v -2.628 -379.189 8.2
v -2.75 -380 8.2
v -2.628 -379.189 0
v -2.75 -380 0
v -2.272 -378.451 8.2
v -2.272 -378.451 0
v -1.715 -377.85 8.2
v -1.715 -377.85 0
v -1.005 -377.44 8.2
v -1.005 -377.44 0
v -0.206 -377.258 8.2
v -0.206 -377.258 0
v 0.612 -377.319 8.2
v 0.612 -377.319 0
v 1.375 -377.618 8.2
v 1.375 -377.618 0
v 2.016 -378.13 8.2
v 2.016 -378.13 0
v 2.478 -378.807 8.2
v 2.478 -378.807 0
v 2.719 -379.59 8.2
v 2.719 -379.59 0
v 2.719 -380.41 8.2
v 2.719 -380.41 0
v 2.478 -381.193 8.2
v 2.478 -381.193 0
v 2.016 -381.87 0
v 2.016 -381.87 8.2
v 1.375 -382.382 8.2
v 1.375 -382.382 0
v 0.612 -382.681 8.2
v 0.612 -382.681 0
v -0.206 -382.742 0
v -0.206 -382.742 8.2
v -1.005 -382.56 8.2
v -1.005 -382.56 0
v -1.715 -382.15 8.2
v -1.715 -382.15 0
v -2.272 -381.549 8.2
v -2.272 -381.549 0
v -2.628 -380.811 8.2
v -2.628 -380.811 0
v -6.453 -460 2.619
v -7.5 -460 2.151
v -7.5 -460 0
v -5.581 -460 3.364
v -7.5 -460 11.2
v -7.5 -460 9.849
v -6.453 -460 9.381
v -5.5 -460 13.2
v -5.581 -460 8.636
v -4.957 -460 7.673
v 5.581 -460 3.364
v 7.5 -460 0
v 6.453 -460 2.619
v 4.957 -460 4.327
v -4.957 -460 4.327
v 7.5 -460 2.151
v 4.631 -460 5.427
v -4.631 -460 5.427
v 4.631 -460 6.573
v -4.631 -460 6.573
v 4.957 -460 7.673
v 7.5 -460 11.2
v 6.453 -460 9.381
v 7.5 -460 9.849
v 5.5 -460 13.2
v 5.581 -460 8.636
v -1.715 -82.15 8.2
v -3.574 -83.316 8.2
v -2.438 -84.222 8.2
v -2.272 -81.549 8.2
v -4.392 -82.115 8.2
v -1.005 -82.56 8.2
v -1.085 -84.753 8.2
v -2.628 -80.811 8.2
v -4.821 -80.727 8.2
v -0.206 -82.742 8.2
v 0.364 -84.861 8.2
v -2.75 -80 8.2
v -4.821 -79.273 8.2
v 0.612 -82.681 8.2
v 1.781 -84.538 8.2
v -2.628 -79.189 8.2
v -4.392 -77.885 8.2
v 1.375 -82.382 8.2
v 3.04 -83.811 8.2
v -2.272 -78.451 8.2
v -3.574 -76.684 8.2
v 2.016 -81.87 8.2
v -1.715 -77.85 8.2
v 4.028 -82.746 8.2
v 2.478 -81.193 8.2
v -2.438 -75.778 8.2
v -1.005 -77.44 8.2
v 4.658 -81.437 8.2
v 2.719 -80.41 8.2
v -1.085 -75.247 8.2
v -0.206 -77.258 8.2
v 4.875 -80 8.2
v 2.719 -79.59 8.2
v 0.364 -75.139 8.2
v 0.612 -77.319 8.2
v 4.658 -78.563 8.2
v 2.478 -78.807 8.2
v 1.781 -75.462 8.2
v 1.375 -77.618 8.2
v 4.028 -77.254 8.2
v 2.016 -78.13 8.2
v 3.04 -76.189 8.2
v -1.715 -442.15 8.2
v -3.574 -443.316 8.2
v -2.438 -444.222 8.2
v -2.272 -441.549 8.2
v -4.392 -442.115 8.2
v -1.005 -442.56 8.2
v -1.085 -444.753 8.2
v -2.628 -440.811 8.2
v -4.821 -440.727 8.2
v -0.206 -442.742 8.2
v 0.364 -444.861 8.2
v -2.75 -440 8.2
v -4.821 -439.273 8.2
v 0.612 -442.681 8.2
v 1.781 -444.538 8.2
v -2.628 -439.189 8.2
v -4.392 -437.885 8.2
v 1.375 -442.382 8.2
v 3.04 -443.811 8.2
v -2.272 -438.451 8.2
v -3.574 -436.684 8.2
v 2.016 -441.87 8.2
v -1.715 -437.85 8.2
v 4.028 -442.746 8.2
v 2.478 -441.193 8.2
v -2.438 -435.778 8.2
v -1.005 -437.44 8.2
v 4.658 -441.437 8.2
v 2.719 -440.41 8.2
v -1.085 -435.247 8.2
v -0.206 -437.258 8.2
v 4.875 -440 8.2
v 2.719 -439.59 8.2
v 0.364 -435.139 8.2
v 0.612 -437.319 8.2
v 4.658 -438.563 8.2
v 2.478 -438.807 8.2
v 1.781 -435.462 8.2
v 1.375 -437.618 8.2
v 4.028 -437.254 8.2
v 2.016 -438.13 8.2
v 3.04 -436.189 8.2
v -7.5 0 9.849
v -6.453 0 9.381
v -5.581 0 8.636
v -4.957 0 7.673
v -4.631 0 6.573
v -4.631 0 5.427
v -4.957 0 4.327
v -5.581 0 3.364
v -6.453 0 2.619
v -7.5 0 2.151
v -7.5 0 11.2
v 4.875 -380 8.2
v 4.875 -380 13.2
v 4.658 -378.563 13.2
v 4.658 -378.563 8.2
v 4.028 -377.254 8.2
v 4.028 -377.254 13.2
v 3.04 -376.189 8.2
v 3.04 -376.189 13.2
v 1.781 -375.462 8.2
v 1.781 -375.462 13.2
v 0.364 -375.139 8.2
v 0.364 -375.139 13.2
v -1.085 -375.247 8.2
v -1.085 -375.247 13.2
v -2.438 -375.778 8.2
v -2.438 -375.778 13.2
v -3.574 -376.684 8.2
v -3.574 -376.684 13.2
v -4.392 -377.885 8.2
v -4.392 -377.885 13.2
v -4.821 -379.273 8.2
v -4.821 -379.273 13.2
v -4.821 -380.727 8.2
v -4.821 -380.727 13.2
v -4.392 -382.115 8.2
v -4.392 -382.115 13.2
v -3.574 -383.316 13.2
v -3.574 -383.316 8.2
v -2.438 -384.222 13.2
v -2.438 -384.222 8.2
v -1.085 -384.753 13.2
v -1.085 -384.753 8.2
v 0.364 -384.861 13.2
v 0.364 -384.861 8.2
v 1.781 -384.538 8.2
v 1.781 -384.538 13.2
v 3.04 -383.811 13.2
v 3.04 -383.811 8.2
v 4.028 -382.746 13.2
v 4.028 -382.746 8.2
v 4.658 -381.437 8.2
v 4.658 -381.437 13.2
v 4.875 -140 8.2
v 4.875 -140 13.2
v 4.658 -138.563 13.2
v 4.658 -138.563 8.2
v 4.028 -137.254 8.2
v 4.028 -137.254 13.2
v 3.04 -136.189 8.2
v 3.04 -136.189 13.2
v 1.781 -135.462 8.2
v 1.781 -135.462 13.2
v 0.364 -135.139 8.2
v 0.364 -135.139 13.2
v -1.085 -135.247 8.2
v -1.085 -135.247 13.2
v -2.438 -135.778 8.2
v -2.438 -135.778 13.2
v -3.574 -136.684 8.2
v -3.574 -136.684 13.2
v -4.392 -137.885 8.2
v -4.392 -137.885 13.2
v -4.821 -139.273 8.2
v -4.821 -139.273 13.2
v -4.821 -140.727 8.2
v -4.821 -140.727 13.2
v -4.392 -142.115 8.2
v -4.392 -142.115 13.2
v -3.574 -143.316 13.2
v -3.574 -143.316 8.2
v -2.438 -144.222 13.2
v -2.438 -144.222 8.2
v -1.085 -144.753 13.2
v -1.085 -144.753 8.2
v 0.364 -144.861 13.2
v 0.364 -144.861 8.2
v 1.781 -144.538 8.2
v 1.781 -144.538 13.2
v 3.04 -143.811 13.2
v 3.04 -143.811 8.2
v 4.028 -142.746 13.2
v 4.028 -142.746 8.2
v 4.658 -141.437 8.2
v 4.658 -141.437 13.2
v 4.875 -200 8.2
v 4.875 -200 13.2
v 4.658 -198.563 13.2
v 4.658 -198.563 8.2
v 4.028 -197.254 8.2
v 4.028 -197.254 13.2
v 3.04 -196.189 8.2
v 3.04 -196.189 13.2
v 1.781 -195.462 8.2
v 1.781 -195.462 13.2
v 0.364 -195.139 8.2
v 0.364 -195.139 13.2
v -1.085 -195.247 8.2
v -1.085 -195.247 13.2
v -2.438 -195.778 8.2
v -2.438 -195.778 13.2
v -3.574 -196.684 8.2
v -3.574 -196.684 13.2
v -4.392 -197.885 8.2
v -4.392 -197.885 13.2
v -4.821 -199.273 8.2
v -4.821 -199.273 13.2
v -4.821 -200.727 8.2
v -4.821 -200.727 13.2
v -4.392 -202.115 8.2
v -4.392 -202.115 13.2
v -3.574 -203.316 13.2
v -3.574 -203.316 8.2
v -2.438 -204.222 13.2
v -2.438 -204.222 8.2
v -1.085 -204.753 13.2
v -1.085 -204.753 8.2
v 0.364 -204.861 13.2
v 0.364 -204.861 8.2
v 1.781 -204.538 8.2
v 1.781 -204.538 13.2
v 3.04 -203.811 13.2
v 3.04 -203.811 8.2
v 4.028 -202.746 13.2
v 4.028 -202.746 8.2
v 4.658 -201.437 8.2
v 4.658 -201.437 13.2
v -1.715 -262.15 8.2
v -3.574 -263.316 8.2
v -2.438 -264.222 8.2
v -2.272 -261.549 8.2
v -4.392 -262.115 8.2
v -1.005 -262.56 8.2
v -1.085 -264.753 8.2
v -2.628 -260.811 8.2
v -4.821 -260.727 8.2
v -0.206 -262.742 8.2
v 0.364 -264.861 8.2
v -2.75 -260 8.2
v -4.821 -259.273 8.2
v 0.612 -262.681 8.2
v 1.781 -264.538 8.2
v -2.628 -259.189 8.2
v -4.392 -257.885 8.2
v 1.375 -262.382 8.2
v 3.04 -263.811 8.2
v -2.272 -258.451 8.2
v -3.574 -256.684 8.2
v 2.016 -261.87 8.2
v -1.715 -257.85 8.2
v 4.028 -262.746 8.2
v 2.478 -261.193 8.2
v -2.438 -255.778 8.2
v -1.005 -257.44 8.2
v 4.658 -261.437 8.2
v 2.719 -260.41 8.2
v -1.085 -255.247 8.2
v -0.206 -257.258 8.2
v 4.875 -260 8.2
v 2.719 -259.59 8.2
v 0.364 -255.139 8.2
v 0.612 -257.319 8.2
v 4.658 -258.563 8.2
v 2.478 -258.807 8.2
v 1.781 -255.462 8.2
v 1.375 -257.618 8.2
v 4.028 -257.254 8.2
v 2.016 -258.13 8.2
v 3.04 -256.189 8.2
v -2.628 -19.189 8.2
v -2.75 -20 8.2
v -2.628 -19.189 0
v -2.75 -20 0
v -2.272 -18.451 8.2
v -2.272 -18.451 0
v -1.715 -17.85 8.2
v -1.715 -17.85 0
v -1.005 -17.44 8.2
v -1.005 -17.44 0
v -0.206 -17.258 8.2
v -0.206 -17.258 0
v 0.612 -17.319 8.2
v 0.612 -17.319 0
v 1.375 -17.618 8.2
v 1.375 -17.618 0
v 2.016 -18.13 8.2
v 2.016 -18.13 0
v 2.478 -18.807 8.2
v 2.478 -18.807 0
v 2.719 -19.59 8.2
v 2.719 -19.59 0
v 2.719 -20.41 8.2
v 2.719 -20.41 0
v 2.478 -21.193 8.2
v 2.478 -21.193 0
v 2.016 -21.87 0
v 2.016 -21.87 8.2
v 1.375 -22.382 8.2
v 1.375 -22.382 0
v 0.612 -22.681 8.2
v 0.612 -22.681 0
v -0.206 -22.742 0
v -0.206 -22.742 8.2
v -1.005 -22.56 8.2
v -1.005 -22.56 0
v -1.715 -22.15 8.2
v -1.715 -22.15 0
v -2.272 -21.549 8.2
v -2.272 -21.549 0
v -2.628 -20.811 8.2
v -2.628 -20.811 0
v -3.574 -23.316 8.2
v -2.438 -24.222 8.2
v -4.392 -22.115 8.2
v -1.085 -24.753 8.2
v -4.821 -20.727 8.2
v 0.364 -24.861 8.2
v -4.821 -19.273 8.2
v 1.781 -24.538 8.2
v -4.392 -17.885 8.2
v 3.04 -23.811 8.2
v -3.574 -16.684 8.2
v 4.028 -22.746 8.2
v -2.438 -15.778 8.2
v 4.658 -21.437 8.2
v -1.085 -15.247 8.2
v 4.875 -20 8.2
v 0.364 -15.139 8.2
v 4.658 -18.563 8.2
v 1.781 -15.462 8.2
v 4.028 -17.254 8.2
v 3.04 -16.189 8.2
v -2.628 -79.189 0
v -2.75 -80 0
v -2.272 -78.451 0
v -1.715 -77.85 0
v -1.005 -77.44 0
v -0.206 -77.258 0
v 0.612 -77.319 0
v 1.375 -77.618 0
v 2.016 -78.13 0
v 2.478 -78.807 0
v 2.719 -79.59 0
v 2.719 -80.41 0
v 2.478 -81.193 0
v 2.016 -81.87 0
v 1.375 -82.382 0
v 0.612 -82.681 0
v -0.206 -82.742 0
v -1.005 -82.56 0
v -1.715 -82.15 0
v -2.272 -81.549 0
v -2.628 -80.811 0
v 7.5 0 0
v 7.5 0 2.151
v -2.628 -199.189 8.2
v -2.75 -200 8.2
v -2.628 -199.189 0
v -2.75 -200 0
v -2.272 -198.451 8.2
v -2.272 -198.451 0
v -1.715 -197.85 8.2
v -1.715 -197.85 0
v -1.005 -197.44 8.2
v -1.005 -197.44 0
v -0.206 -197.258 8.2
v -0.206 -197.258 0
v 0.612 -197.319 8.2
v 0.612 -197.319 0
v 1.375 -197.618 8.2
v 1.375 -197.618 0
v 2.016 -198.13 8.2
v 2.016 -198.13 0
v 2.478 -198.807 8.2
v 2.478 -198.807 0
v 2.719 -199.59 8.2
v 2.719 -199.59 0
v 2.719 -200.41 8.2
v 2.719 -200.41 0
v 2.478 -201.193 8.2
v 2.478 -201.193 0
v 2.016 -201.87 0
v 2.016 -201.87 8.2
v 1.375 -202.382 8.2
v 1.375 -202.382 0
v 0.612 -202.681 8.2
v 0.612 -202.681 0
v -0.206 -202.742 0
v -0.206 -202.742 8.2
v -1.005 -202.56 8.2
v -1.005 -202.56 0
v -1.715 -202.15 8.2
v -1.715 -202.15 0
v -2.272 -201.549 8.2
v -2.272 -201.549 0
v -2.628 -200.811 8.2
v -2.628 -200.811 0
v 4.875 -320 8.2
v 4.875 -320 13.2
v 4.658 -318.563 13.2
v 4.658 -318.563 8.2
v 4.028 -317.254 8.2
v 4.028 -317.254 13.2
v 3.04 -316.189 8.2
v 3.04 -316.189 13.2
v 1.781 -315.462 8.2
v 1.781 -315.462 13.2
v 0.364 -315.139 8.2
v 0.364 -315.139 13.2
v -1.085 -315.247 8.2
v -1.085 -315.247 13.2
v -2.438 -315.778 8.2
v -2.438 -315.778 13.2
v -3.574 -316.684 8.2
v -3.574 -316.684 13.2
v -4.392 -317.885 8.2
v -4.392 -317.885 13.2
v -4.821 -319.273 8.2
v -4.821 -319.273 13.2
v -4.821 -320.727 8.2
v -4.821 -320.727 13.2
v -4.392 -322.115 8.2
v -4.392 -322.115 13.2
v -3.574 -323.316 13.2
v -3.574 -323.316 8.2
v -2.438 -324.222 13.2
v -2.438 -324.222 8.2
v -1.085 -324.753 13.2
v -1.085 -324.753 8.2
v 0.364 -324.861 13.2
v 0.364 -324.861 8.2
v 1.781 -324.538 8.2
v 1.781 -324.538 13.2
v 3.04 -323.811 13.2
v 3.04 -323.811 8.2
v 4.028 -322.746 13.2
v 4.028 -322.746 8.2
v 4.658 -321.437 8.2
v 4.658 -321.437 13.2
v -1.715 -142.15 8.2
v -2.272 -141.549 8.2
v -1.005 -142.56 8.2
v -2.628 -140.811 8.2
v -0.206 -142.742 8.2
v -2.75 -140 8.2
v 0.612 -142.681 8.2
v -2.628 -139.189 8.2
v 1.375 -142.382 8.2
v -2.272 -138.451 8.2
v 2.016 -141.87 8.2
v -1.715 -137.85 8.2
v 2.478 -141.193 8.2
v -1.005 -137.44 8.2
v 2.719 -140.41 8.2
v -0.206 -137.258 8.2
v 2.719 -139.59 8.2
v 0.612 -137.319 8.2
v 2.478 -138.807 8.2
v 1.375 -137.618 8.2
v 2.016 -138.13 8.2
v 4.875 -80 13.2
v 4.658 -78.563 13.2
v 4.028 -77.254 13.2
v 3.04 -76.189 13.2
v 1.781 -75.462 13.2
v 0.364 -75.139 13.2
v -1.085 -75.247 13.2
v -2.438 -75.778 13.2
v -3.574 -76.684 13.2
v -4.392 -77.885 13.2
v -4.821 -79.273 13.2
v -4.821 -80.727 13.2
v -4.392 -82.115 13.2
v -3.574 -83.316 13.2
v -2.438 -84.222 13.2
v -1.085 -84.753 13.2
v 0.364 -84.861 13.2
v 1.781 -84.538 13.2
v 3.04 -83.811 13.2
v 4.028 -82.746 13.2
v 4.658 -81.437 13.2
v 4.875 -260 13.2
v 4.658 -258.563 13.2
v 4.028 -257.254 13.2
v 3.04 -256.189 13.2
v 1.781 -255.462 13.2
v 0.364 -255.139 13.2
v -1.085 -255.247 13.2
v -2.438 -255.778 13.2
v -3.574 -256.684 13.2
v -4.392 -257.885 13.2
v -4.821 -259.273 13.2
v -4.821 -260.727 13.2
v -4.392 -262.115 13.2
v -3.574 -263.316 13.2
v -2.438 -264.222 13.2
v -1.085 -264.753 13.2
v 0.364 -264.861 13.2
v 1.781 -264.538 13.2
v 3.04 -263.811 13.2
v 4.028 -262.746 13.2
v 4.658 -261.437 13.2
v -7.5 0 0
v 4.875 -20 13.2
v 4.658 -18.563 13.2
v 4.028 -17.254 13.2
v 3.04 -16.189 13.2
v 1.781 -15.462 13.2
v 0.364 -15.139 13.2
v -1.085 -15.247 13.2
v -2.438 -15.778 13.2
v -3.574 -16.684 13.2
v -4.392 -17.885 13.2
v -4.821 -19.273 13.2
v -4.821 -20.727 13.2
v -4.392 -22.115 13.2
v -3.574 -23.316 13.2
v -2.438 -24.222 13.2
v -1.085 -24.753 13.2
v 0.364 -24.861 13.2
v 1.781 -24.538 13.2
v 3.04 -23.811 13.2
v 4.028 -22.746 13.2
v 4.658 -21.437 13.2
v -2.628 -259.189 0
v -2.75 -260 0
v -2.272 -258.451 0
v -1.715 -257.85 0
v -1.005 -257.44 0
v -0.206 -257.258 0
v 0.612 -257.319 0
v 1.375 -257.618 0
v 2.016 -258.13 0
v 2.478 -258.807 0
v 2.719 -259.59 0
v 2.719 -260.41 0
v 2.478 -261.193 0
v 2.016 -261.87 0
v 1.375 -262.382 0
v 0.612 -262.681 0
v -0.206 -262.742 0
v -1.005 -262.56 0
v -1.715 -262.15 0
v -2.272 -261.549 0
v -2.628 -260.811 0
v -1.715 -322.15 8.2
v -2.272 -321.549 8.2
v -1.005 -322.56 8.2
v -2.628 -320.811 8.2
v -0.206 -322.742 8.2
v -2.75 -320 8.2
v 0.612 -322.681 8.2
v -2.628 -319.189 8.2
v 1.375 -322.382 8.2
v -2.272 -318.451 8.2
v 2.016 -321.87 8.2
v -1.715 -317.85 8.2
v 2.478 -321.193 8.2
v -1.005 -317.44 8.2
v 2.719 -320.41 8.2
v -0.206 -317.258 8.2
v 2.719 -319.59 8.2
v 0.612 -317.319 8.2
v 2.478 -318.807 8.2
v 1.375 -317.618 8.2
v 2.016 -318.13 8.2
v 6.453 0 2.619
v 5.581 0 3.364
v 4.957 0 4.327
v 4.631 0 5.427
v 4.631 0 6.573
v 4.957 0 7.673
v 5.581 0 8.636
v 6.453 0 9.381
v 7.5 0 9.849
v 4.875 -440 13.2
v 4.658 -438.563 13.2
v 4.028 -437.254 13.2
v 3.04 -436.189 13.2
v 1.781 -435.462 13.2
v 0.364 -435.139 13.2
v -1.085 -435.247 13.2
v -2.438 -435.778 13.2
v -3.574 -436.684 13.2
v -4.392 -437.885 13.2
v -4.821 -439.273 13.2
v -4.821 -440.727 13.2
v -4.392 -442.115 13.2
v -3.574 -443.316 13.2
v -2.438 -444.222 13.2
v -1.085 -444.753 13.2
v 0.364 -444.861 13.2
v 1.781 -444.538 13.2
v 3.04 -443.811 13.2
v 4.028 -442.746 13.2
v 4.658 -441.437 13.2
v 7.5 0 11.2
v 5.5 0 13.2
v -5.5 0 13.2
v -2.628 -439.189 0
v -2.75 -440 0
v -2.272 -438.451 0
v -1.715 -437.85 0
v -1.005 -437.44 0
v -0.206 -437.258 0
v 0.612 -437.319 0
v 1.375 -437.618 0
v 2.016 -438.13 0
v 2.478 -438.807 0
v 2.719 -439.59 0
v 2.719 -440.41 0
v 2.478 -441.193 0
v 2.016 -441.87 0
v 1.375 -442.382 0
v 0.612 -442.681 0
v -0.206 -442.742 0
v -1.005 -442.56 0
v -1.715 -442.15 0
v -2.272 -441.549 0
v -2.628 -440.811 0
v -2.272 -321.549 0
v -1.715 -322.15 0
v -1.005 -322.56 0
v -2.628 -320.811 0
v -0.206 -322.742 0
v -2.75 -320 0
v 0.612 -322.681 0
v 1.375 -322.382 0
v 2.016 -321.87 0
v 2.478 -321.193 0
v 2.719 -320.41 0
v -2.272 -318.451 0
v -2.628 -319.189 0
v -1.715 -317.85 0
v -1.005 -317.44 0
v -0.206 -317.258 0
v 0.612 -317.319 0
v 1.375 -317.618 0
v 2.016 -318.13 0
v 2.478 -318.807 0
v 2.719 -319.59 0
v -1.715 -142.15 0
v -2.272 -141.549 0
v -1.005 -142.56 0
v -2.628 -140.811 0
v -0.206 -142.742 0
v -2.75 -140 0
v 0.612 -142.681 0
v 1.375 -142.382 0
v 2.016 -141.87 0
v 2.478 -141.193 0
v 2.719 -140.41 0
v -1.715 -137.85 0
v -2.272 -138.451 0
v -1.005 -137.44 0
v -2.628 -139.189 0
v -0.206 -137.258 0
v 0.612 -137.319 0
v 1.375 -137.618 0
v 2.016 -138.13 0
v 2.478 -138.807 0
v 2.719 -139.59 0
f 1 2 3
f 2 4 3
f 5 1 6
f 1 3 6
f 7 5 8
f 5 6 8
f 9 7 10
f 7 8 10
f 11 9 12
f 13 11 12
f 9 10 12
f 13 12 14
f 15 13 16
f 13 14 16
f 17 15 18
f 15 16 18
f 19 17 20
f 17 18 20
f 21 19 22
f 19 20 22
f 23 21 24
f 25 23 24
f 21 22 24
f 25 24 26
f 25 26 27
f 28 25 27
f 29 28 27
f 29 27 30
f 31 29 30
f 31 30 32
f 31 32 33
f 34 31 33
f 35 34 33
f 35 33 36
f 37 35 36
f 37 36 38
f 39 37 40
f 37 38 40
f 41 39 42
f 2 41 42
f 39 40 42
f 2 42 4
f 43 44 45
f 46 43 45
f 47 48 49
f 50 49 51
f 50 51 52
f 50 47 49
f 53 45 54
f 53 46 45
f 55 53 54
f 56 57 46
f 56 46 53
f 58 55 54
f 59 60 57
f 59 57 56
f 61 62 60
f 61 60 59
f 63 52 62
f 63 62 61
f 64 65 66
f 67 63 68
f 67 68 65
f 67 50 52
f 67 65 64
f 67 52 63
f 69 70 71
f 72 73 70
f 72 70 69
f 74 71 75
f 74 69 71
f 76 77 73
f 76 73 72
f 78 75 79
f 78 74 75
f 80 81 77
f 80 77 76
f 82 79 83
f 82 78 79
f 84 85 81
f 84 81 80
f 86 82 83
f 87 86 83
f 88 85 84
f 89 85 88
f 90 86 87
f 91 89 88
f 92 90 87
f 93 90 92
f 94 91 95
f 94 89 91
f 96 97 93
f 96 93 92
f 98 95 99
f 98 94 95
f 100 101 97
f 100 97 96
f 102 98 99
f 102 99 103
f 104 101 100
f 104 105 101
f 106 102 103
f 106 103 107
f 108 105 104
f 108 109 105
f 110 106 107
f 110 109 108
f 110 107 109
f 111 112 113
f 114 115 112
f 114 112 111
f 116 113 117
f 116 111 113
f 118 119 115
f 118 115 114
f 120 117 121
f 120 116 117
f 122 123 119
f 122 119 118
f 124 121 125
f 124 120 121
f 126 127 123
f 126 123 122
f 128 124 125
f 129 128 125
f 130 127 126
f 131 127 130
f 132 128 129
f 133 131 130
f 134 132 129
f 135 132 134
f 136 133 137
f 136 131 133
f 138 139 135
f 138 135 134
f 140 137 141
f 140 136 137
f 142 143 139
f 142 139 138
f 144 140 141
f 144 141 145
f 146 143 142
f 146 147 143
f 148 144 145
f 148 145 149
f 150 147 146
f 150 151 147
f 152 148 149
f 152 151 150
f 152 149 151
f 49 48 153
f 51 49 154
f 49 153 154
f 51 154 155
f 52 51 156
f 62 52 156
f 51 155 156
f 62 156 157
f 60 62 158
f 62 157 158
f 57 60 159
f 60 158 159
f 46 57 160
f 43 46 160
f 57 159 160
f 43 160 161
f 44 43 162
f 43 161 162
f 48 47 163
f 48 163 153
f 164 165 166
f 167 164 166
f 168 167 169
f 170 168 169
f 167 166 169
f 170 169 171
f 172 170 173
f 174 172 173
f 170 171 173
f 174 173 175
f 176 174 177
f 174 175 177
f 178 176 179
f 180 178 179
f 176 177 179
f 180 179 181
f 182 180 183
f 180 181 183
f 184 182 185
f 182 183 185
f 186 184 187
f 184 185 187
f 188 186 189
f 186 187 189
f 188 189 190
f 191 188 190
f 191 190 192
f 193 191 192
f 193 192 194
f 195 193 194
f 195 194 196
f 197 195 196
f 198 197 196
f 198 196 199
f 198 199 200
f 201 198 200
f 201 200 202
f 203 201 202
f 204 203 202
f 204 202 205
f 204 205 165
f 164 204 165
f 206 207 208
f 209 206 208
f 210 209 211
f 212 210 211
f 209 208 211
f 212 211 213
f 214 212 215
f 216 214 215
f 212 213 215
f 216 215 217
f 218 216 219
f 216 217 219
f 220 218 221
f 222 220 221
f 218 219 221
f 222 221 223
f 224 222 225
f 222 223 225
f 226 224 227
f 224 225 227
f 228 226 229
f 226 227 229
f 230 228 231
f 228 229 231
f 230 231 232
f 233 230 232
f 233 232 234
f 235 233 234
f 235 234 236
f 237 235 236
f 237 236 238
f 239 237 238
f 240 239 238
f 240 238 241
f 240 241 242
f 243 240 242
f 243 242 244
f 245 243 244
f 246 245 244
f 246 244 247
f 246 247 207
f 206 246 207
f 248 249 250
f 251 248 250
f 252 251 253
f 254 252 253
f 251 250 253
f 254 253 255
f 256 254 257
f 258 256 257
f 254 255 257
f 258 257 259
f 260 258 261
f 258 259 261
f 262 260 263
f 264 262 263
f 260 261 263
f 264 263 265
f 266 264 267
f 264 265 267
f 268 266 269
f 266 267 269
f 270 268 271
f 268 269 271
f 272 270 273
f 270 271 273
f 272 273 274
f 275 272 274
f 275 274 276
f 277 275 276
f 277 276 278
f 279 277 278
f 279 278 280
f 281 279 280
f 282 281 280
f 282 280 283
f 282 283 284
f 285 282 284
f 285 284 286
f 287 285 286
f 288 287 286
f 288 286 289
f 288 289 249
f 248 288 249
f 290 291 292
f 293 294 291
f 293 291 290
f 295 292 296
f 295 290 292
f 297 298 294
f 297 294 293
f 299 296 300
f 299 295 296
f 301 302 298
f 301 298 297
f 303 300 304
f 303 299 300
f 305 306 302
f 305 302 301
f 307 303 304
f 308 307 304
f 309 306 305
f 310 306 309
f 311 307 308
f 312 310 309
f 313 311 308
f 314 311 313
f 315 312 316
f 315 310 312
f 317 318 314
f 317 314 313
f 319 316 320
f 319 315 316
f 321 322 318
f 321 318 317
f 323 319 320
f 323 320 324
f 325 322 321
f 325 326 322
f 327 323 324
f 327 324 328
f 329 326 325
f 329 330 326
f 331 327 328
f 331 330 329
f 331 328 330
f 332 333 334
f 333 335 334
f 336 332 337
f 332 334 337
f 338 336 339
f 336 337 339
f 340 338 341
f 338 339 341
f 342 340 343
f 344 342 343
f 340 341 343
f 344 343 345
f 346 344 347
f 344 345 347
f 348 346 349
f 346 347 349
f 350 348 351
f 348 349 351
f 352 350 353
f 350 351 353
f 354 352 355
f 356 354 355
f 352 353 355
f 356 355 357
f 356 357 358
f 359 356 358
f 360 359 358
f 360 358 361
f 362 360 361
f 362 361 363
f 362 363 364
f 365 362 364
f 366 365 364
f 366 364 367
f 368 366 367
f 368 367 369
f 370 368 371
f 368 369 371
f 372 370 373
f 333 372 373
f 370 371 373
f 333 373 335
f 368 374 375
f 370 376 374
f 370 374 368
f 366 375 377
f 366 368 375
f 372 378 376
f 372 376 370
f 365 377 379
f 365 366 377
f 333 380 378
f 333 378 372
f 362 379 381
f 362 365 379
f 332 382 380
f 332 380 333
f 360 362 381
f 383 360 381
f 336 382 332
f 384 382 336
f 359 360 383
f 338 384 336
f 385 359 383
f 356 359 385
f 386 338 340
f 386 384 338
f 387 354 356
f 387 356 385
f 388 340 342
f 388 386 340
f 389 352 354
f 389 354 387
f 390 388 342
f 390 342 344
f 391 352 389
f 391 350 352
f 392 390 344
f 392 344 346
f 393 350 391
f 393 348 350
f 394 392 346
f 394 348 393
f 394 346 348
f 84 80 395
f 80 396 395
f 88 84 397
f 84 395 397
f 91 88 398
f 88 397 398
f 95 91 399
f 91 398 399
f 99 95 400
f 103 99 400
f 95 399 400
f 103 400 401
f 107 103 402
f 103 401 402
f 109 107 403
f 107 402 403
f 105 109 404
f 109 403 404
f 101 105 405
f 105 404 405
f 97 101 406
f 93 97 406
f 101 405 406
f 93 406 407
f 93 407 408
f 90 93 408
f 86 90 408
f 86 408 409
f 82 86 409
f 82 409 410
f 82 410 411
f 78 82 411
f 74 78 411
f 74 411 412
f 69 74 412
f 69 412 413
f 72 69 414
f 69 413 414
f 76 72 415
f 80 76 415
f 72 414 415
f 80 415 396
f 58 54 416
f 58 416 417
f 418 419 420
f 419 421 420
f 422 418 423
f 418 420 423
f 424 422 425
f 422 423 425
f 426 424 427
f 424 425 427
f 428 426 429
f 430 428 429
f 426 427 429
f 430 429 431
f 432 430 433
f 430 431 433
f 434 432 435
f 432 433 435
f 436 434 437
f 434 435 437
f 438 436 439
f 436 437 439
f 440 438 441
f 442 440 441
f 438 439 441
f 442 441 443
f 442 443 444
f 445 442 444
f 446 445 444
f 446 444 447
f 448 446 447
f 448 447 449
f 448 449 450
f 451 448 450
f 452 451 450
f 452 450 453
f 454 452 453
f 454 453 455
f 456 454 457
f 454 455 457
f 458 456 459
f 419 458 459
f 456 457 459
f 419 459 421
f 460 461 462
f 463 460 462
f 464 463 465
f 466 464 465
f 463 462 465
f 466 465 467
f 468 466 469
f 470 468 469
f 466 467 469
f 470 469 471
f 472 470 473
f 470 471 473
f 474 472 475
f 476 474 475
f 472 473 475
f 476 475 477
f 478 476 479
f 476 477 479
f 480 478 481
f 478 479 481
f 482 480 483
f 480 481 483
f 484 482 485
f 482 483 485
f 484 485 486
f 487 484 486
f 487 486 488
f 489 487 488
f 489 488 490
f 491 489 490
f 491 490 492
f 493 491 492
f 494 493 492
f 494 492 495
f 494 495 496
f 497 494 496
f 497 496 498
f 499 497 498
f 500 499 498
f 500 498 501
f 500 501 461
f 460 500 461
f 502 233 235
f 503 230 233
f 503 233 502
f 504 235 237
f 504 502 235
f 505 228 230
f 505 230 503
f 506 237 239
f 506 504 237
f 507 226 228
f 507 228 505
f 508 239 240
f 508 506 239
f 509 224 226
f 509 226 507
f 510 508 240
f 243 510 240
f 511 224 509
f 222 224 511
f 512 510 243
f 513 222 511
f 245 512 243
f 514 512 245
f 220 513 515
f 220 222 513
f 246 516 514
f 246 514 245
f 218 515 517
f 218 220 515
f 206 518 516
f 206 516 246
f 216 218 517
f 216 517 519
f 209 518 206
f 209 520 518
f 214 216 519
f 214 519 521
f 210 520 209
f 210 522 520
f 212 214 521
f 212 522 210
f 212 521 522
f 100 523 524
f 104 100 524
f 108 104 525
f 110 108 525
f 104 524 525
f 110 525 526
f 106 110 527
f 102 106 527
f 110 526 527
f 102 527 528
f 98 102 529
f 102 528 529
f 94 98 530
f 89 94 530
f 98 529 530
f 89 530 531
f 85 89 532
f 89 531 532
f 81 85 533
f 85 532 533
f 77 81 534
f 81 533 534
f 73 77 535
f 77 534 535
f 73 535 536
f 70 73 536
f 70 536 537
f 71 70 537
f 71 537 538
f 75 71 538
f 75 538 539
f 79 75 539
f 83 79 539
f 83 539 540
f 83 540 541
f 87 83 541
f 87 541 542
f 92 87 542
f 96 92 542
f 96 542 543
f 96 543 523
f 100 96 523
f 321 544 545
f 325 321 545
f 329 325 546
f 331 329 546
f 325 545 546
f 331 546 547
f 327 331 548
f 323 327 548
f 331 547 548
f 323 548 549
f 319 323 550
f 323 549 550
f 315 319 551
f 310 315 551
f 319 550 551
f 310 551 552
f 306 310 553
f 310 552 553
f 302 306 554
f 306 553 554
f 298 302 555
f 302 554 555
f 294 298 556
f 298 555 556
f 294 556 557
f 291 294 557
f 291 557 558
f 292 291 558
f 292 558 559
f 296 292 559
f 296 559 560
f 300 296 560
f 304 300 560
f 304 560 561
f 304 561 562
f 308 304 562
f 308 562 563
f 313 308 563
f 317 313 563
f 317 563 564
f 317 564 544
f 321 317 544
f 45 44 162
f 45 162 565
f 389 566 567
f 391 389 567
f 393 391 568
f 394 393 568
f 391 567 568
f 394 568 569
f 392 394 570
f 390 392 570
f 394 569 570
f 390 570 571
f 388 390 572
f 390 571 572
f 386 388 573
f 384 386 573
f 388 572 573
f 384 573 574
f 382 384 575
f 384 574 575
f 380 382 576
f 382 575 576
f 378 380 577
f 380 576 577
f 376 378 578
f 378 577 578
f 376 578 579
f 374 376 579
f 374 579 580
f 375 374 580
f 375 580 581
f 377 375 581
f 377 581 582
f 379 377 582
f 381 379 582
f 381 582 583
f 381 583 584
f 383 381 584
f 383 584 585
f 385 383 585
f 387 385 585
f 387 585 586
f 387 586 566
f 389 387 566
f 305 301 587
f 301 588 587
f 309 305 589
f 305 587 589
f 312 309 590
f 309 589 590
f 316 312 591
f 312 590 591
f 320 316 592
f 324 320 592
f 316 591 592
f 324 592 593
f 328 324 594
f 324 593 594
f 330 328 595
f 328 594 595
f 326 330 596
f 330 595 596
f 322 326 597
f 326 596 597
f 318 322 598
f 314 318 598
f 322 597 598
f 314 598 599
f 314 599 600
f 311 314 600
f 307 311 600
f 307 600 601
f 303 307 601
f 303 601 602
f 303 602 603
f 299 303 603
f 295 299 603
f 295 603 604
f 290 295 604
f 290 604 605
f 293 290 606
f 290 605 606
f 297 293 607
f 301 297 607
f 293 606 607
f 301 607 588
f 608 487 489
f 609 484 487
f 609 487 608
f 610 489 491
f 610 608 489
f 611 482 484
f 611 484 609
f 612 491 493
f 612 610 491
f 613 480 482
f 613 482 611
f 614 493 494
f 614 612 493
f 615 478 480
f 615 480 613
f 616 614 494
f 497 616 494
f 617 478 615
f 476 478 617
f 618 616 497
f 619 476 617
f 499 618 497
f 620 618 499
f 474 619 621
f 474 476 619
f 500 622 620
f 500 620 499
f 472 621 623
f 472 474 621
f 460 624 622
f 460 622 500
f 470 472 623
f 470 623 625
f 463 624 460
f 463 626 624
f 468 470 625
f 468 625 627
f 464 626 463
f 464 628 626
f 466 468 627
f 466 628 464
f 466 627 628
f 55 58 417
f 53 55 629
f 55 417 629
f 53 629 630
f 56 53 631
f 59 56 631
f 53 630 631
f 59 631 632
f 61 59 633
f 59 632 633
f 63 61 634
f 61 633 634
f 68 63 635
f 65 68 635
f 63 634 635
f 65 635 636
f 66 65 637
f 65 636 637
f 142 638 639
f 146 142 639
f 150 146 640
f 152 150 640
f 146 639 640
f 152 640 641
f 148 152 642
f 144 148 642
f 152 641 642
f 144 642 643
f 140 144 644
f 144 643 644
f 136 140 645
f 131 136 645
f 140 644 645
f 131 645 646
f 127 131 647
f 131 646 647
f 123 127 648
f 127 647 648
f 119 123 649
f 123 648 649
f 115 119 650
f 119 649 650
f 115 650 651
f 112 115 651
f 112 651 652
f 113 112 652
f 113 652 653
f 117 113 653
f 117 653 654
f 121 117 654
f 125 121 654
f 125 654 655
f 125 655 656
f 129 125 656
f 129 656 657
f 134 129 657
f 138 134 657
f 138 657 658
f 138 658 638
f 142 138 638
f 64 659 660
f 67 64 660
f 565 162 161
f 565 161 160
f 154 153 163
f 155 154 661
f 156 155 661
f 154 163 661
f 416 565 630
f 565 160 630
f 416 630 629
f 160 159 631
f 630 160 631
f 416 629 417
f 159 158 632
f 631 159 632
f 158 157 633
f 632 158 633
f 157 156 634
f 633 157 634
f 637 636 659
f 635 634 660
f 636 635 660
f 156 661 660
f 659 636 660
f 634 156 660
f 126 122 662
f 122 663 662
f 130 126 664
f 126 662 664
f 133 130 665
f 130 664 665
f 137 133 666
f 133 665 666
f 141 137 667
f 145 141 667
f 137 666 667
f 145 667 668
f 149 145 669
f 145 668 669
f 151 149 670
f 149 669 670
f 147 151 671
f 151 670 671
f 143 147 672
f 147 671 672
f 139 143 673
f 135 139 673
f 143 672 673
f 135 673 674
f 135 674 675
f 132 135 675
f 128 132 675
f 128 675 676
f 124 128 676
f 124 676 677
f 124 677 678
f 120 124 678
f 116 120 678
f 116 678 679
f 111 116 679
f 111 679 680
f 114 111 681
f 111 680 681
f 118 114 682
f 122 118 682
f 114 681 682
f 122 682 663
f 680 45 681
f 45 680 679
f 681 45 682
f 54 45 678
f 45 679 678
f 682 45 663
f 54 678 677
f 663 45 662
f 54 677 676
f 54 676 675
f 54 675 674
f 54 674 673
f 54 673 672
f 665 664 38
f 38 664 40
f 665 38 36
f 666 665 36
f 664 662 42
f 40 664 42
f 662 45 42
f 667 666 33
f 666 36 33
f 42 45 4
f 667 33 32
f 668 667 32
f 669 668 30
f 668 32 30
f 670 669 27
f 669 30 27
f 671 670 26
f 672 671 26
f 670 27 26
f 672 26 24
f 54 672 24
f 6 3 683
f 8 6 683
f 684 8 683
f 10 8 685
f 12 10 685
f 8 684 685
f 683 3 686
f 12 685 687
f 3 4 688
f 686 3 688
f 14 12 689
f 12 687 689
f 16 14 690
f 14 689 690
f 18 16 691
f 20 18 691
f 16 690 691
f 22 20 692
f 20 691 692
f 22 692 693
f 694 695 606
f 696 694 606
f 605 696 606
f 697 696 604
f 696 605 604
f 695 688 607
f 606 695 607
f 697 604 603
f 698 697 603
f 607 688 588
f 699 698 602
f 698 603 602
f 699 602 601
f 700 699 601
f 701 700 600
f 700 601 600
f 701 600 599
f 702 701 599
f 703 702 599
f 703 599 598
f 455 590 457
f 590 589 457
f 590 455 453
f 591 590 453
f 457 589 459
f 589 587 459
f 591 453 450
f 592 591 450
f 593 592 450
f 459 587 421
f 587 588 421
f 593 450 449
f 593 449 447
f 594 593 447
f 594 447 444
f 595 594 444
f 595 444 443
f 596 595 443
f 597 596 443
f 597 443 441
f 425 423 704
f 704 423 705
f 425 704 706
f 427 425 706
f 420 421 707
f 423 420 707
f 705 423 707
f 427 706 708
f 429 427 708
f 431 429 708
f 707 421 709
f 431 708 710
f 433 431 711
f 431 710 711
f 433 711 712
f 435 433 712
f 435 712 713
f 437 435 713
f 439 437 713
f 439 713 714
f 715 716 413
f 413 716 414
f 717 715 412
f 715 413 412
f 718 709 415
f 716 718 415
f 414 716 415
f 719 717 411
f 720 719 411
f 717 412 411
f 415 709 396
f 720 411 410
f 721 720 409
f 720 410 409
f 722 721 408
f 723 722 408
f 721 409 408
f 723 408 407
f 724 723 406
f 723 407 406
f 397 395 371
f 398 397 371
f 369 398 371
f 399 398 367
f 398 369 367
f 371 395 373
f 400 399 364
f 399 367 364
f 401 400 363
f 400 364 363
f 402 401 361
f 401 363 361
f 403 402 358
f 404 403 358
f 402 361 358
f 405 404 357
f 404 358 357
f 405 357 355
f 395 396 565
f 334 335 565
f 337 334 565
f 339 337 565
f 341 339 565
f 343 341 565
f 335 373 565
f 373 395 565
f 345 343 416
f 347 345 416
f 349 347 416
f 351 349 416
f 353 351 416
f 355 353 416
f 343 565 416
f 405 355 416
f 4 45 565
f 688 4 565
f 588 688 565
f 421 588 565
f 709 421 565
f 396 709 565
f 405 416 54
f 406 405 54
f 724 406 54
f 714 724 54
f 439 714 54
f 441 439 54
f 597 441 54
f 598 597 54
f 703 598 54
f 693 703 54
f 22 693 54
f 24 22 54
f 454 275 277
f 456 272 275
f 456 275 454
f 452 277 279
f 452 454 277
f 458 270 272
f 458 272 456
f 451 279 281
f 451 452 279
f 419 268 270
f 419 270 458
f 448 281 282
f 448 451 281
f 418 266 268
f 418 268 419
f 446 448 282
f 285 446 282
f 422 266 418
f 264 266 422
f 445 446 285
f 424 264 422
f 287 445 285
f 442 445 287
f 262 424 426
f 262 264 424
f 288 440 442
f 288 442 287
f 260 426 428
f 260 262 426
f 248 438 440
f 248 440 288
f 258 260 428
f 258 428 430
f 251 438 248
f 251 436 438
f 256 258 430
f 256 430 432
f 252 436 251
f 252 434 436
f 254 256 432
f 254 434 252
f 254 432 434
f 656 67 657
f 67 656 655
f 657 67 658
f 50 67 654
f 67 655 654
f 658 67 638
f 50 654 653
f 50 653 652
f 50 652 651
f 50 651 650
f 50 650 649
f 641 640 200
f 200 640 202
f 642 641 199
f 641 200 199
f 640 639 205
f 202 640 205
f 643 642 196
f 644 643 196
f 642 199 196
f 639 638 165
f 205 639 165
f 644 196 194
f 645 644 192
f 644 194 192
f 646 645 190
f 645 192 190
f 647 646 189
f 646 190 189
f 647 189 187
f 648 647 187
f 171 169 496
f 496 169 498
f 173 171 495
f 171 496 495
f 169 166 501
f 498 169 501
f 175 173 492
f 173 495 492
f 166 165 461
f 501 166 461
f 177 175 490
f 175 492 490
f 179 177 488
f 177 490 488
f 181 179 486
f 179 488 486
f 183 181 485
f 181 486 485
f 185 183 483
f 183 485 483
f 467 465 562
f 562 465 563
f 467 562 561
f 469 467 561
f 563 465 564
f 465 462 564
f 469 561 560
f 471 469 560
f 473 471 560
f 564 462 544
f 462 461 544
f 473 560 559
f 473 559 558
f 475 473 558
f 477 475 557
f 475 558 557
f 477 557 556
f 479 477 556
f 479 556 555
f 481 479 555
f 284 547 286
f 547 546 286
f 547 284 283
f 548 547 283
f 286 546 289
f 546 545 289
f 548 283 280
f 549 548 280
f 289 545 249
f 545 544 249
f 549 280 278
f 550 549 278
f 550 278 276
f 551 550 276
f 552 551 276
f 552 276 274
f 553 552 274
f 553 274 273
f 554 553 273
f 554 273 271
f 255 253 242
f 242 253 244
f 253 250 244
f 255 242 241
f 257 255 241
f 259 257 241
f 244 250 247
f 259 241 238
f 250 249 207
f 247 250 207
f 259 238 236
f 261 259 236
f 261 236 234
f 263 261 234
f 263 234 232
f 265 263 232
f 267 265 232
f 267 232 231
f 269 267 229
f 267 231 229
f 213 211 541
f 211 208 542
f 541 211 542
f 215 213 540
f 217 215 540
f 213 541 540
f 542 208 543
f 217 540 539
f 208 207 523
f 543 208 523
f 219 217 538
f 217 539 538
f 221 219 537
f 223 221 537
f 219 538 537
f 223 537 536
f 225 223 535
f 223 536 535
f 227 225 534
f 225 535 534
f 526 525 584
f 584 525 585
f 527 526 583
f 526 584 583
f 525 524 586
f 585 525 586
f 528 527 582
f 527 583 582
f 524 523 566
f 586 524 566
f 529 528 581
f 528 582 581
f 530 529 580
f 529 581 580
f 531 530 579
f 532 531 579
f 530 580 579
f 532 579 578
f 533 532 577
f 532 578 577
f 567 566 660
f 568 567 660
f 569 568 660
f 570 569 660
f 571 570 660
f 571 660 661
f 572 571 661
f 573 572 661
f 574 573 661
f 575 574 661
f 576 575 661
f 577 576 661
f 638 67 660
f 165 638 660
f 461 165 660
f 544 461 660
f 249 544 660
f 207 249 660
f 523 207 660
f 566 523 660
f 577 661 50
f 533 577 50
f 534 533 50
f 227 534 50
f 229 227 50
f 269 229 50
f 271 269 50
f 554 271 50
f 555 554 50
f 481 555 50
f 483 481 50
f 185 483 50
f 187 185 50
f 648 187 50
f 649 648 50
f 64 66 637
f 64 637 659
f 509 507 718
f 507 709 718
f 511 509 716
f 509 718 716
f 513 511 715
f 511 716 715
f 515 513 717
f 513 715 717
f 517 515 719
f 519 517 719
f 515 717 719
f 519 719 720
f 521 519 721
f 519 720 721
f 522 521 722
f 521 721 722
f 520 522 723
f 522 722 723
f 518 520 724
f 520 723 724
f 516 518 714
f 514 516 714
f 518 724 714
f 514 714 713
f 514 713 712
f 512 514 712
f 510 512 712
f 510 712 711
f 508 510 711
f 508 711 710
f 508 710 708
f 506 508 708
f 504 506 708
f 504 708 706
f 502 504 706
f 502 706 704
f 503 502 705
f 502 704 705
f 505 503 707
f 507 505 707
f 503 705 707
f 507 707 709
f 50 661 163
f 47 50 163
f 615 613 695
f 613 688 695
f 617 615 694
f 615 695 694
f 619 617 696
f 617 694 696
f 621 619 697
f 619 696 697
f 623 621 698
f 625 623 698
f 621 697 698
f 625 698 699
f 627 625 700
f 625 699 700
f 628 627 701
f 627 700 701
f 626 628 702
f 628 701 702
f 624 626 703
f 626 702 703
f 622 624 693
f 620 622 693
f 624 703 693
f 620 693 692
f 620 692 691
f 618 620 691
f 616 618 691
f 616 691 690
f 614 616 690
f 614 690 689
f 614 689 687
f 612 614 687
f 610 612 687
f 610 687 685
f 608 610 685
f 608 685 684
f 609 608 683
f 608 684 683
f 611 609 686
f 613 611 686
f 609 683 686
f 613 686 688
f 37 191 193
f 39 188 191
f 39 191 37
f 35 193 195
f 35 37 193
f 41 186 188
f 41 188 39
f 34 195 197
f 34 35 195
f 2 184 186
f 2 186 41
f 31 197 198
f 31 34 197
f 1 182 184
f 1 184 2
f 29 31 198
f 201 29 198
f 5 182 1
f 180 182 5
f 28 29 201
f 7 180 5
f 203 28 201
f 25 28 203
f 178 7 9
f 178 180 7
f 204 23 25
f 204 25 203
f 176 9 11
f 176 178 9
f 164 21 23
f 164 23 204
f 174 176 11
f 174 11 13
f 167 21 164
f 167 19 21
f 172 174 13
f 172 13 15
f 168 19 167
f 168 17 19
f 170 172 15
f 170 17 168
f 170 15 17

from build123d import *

# Parameters (mm, degrees)
F1_DEPTH       = 460
F3_D           = 5.5
F3_CBORE_D     = 9.75
F3_CBORE_DEPTH = 5


with BuildPart() as f1:
    # F0 (on Front) → F1 (new body)
    with BuildSketch(Plane.XZ):
        with BuildLine():
            Line((-7.5, 2.1513768696), (-7.5, 0))
            Line((-7.5, 0), (7.5, 0))
            Line((7.5, 0), (7.5, 2.1513768696))
            ThreePointArc((7.5, 2.1513768696), (4.59, 6), (7.5, 9.8486231304))
            Line((7.5, 9.8486231304), (7.5, 11.2))
            Line((7.5, 11.2), (5.5, 13.2))
            Line((5.5, 13.2), (-5.5, 13.2))
            Line((-5.5, 13.2), (-7.5, 11.2))
            Line((-7.5, 11.2), (-7.5, 9.8486231304))
            ThreePointArc((-7.5, 9.8486231304), (-4.59, 6), (-7.5, 2.1513768696))
        make_face()
    extrude(amount=F1_DEPTH)

    # F3 (through all)
    with Locations(Plane.XY.offset(13.2)):
        with Locations((0, -20), (0, -80), (0, -140), (0, -200), (0, -260), (0, -320), (0, -380), (0, -440)):
            CounterBoreHole(F3_D / 2, F3_CBORE_D / 2, F3_CBORE_DEPTH)


solid = f1.part
